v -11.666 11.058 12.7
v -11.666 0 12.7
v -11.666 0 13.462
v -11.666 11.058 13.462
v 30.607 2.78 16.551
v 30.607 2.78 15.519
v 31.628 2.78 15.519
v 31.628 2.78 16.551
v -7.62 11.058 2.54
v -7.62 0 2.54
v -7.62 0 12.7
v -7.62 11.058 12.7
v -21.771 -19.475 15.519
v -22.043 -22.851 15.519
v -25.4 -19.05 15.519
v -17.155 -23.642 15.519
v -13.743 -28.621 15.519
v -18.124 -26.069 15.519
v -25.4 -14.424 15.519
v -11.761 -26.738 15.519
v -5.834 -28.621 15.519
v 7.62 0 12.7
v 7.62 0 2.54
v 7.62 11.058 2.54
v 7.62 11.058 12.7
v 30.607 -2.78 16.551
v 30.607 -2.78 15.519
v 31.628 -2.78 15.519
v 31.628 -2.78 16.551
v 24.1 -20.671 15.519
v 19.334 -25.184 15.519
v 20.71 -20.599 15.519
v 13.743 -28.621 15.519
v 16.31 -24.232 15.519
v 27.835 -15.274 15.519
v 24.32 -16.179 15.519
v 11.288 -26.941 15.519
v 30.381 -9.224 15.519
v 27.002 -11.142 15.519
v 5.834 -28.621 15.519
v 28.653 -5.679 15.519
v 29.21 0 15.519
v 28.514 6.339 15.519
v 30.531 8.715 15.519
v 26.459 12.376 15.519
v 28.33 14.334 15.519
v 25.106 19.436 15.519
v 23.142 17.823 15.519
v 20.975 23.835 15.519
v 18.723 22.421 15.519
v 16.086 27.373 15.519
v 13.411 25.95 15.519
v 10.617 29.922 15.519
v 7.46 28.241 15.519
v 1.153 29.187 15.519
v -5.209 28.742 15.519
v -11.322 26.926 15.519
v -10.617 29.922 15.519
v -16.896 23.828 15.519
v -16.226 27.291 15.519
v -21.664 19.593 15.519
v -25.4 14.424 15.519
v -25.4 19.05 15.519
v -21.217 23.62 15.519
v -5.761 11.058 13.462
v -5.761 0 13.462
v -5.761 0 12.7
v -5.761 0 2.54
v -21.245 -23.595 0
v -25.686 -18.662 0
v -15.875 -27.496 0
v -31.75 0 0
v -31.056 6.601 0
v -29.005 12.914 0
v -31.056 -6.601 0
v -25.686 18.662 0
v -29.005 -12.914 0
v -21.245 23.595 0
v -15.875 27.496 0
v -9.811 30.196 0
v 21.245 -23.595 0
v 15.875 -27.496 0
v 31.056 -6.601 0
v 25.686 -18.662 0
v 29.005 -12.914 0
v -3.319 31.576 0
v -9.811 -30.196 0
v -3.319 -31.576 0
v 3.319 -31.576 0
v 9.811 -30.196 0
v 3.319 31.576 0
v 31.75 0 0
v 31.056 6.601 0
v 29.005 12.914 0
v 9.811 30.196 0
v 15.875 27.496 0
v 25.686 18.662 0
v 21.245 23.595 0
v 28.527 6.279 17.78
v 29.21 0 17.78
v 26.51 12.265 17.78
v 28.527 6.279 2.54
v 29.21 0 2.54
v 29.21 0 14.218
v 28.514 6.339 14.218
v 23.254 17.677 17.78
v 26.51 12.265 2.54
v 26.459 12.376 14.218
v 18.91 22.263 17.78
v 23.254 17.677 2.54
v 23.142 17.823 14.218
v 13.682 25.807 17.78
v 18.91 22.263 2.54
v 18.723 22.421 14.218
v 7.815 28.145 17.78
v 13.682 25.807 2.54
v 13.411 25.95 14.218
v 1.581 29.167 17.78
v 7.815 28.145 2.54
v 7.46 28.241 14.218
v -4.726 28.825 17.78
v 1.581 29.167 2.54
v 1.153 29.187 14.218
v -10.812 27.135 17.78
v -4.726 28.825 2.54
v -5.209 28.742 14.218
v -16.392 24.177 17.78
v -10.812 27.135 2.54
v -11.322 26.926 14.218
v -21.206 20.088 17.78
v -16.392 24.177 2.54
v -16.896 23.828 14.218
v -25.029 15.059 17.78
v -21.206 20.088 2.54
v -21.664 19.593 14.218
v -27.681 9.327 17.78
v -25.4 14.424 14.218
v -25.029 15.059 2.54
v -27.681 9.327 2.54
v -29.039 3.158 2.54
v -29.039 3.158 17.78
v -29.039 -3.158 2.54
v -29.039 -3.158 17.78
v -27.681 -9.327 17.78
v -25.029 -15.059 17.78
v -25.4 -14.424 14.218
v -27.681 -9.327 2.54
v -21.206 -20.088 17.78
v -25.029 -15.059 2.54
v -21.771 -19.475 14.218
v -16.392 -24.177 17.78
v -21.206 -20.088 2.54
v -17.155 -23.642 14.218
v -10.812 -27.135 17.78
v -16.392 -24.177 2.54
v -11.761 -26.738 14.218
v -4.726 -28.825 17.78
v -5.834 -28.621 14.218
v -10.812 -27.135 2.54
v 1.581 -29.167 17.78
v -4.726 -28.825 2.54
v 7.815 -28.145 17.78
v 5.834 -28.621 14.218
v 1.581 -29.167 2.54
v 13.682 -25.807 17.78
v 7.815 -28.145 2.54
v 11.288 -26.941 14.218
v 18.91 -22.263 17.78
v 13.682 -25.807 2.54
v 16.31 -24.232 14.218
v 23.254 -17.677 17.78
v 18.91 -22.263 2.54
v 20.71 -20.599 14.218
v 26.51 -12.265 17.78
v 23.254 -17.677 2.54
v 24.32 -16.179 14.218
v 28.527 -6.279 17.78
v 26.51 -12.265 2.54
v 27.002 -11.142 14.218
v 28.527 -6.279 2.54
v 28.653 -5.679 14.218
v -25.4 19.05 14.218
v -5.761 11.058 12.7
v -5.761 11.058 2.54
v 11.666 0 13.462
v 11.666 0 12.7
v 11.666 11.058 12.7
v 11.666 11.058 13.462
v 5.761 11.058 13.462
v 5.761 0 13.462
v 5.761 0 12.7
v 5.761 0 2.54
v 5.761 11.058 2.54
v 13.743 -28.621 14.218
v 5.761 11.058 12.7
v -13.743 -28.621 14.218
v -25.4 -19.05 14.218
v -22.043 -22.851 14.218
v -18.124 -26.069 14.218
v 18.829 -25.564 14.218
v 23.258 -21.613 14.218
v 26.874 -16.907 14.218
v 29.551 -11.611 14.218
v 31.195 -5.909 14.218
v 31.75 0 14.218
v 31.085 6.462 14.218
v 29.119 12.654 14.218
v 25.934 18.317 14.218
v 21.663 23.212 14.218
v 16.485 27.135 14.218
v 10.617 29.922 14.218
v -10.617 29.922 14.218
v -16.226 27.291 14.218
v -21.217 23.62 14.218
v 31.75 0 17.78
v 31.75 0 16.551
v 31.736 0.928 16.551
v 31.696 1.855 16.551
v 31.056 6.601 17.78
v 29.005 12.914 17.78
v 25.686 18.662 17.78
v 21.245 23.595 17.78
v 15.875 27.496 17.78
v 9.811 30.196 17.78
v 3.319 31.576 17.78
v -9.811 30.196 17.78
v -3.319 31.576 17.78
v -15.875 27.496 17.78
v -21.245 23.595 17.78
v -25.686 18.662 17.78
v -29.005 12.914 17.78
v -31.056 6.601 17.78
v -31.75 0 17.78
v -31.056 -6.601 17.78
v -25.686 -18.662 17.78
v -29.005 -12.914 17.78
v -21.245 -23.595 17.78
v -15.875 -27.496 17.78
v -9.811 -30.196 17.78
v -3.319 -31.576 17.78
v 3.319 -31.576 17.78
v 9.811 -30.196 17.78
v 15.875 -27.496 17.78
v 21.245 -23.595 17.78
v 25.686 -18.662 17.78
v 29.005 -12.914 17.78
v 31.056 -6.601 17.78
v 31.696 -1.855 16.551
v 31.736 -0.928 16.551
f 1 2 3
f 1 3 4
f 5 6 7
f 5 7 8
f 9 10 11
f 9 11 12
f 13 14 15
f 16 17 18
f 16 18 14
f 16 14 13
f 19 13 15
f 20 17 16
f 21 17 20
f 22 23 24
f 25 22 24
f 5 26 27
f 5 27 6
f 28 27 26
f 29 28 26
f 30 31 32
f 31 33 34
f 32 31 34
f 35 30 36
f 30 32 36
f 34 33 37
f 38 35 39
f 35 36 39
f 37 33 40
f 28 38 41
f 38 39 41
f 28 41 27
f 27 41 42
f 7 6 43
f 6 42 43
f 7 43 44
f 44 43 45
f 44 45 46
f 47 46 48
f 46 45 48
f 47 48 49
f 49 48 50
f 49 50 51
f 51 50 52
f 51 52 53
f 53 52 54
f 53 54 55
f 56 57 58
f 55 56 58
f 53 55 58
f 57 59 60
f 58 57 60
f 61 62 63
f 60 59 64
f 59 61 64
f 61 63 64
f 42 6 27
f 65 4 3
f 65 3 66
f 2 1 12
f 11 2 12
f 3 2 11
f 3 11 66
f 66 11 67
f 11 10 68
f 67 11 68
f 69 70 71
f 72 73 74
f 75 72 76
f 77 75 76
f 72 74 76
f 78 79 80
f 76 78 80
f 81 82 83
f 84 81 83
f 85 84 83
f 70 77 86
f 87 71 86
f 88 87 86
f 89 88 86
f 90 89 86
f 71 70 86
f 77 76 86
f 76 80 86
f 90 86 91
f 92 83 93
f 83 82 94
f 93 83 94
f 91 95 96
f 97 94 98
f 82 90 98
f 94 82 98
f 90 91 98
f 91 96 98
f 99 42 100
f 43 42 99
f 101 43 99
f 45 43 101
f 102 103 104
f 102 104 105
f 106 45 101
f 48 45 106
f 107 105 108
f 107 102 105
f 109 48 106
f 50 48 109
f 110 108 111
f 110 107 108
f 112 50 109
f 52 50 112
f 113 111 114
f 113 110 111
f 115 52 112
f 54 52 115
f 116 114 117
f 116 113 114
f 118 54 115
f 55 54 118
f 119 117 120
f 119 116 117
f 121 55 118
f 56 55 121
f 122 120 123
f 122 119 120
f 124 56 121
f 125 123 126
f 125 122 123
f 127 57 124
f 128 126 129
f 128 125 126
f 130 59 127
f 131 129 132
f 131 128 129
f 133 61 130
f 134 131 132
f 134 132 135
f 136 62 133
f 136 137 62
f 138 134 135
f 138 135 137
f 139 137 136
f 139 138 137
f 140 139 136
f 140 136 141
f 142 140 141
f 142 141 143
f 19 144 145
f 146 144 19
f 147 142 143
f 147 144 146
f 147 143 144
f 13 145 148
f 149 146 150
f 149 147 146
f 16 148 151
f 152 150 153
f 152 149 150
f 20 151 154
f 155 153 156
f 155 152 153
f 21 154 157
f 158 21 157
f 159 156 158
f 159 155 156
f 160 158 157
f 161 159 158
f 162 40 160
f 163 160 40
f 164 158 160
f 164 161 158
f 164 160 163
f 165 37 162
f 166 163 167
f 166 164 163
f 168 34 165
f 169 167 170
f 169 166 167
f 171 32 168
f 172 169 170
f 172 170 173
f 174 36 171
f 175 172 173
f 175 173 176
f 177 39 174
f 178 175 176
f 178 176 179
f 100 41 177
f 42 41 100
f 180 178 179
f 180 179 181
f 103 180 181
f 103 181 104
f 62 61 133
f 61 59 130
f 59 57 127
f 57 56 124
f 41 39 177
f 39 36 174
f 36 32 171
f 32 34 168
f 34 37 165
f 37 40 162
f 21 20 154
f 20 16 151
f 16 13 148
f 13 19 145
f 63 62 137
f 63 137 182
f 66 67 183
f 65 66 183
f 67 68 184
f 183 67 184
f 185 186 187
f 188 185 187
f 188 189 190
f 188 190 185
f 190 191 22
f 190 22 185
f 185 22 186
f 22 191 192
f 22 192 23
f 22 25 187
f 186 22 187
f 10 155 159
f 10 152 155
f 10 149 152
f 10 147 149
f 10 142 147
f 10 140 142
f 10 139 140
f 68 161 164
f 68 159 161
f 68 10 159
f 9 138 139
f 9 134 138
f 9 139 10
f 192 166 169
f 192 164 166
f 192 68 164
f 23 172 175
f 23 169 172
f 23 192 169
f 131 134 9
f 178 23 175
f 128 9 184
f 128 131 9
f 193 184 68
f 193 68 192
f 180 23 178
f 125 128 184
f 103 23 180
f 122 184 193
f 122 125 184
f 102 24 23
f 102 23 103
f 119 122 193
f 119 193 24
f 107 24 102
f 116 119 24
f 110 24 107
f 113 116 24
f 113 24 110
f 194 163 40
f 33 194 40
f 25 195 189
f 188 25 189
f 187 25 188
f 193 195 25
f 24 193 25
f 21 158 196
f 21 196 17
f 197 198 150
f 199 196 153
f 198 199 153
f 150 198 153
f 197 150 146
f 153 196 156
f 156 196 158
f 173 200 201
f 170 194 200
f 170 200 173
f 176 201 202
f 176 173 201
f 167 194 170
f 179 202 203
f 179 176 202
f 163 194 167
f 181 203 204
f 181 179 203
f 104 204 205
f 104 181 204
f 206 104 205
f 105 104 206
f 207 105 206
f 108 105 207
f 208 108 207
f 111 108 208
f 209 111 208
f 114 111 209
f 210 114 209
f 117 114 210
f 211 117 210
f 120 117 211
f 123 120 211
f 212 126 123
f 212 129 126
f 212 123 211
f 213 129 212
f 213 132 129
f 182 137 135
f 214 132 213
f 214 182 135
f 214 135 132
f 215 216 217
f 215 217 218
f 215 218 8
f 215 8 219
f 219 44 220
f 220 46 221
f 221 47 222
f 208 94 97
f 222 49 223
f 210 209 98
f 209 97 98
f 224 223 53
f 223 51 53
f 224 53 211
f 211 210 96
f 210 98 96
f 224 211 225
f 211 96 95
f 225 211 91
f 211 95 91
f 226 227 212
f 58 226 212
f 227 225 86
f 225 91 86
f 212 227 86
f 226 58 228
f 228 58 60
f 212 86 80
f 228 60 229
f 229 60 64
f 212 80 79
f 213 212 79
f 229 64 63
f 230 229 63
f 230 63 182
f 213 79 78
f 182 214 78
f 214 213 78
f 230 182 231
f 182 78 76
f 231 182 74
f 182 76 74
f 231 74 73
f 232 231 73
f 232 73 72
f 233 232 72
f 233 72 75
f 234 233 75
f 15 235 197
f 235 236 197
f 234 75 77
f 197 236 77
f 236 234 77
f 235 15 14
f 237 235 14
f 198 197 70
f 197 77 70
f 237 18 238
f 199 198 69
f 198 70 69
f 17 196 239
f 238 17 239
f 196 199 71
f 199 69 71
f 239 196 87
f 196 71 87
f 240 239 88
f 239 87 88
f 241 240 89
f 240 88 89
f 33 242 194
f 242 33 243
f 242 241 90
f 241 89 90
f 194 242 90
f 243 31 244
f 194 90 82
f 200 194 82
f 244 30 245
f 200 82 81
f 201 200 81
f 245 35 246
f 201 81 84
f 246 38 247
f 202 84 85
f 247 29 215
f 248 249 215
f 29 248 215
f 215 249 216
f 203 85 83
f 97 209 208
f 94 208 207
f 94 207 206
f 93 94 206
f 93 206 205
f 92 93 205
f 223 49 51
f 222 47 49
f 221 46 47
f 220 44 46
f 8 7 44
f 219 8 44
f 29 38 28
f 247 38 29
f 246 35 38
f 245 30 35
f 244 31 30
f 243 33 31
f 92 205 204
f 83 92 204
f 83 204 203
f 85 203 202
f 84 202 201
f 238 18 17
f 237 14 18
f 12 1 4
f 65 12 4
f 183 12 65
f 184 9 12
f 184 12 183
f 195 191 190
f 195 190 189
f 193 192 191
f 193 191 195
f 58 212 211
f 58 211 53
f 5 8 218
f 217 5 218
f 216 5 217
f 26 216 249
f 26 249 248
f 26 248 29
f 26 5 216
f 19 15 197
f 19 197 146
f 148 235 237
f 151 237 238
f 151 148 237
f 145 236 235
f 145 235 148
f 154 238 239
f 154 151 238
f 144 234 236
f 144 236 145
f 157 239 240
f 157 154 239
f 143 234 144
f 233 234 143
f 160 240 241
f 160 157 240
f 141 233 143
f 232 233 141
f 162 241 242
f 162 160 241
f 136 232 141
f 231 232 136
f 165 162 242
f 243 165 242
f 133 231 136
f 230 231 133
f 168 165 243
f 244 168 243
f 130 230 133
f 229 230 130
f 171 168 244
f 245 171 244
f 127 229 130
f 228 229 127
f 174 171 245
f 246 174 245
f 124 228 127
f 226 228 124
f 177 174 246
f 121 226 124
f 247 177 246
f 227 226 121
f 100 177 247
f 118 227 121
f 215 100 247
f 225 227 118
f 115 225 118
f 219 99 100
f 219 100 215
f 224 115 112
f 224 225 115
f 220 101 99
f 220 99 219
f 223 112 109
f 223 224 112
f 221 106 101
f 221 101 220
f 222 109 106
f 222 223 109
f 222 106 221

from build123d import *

# Parameters (mm, degrees)
F0_R          = 31.75
F1_DEPTH      = 17.78
F2_T          = -2.54
F3_W          = 1.858536154
F3_H          = 11.058293283
F4_DEPTH      = 10.16
F5_W          = 5.9044365771
F5_H          = 11.058293283
F6_DEPTH      = 0.762
F7_W          = 58.5439018905
F7_H          = 1.300974749
F8_DEPTH      = 43.434
F8_DEPTH_BACK = 25.4
F10_START     = 30.607
F9_W          = 2.780330833
F9_H          = 1.4108410105
F10_DEPTH     = 3.683


with BuildPart() as f1:
    # F0 (on Top) → F1 (new body)
    with BuildSketch(Plane.XY):
        Circle(F0_R)
    extrude(amount=F1_DEPTH)

    # F2
    f2_openings = [f1.faces().sort_by_distance(p)[0] for p in [
        (0, 0, 17.78),
    ]]
    offset(amount=F2_T, openings=f2_openings)

    # F3 (on face) → F4 (join)
    with BuildSketch(Plane.XY.offset(2.54)):
        with Locations((-6.6907317378, 5.5291466415)):
            Rectangle(F3_W, F3_H)
        with Locations((6.6907317378, 5.5291466415)):
            Rectangle(F3_W, F3_H)
    extrude(amount=F4_DEPTH)

    # F5 (on face) → F6 (join)
    with BuildSketch(Plane.XY.offset(12.7)):
        with Locations((-8.7136819493, 5.5291466415)):
            Rectangle(F5_W, F5_H)
        with Locations((8.7136819493, 5.5291466415)):
            Rectangle(F5_W, F5_H)
    extrude(amount=F6_DEPTH)

    # F7 (on Right) → F8 (cut, two sides)
    with BuildSketch(Plane.YZ) as f8_sk:
        with Locations((0.6504878402, 14.8682934232)):
            Rectangle(F7_W, F7_H)
    extrude(amount=F8_DEPTH, mode=Mode.SUBTRACT)
    extrude(f8_sk.sketch, amount=-F8_DEPTH_BACK, mode=Mode.SUBTRACT)

    # F9 (on Right) → F10 (cut)
    with BuildSketch(Plane.YZ.offset(F10_START)):
        with Locations((-1.3901654165, 15.8451446332)):
            Rectangle(F9_W, F9_H)
        with Locations((1.3901654165, 15.8451446332)):
            Rectangle(F9_W, F9_H)
    extrude(amount=F10_DEPTH, mode=Mode.SUBTRACT)


solid = f1.part
